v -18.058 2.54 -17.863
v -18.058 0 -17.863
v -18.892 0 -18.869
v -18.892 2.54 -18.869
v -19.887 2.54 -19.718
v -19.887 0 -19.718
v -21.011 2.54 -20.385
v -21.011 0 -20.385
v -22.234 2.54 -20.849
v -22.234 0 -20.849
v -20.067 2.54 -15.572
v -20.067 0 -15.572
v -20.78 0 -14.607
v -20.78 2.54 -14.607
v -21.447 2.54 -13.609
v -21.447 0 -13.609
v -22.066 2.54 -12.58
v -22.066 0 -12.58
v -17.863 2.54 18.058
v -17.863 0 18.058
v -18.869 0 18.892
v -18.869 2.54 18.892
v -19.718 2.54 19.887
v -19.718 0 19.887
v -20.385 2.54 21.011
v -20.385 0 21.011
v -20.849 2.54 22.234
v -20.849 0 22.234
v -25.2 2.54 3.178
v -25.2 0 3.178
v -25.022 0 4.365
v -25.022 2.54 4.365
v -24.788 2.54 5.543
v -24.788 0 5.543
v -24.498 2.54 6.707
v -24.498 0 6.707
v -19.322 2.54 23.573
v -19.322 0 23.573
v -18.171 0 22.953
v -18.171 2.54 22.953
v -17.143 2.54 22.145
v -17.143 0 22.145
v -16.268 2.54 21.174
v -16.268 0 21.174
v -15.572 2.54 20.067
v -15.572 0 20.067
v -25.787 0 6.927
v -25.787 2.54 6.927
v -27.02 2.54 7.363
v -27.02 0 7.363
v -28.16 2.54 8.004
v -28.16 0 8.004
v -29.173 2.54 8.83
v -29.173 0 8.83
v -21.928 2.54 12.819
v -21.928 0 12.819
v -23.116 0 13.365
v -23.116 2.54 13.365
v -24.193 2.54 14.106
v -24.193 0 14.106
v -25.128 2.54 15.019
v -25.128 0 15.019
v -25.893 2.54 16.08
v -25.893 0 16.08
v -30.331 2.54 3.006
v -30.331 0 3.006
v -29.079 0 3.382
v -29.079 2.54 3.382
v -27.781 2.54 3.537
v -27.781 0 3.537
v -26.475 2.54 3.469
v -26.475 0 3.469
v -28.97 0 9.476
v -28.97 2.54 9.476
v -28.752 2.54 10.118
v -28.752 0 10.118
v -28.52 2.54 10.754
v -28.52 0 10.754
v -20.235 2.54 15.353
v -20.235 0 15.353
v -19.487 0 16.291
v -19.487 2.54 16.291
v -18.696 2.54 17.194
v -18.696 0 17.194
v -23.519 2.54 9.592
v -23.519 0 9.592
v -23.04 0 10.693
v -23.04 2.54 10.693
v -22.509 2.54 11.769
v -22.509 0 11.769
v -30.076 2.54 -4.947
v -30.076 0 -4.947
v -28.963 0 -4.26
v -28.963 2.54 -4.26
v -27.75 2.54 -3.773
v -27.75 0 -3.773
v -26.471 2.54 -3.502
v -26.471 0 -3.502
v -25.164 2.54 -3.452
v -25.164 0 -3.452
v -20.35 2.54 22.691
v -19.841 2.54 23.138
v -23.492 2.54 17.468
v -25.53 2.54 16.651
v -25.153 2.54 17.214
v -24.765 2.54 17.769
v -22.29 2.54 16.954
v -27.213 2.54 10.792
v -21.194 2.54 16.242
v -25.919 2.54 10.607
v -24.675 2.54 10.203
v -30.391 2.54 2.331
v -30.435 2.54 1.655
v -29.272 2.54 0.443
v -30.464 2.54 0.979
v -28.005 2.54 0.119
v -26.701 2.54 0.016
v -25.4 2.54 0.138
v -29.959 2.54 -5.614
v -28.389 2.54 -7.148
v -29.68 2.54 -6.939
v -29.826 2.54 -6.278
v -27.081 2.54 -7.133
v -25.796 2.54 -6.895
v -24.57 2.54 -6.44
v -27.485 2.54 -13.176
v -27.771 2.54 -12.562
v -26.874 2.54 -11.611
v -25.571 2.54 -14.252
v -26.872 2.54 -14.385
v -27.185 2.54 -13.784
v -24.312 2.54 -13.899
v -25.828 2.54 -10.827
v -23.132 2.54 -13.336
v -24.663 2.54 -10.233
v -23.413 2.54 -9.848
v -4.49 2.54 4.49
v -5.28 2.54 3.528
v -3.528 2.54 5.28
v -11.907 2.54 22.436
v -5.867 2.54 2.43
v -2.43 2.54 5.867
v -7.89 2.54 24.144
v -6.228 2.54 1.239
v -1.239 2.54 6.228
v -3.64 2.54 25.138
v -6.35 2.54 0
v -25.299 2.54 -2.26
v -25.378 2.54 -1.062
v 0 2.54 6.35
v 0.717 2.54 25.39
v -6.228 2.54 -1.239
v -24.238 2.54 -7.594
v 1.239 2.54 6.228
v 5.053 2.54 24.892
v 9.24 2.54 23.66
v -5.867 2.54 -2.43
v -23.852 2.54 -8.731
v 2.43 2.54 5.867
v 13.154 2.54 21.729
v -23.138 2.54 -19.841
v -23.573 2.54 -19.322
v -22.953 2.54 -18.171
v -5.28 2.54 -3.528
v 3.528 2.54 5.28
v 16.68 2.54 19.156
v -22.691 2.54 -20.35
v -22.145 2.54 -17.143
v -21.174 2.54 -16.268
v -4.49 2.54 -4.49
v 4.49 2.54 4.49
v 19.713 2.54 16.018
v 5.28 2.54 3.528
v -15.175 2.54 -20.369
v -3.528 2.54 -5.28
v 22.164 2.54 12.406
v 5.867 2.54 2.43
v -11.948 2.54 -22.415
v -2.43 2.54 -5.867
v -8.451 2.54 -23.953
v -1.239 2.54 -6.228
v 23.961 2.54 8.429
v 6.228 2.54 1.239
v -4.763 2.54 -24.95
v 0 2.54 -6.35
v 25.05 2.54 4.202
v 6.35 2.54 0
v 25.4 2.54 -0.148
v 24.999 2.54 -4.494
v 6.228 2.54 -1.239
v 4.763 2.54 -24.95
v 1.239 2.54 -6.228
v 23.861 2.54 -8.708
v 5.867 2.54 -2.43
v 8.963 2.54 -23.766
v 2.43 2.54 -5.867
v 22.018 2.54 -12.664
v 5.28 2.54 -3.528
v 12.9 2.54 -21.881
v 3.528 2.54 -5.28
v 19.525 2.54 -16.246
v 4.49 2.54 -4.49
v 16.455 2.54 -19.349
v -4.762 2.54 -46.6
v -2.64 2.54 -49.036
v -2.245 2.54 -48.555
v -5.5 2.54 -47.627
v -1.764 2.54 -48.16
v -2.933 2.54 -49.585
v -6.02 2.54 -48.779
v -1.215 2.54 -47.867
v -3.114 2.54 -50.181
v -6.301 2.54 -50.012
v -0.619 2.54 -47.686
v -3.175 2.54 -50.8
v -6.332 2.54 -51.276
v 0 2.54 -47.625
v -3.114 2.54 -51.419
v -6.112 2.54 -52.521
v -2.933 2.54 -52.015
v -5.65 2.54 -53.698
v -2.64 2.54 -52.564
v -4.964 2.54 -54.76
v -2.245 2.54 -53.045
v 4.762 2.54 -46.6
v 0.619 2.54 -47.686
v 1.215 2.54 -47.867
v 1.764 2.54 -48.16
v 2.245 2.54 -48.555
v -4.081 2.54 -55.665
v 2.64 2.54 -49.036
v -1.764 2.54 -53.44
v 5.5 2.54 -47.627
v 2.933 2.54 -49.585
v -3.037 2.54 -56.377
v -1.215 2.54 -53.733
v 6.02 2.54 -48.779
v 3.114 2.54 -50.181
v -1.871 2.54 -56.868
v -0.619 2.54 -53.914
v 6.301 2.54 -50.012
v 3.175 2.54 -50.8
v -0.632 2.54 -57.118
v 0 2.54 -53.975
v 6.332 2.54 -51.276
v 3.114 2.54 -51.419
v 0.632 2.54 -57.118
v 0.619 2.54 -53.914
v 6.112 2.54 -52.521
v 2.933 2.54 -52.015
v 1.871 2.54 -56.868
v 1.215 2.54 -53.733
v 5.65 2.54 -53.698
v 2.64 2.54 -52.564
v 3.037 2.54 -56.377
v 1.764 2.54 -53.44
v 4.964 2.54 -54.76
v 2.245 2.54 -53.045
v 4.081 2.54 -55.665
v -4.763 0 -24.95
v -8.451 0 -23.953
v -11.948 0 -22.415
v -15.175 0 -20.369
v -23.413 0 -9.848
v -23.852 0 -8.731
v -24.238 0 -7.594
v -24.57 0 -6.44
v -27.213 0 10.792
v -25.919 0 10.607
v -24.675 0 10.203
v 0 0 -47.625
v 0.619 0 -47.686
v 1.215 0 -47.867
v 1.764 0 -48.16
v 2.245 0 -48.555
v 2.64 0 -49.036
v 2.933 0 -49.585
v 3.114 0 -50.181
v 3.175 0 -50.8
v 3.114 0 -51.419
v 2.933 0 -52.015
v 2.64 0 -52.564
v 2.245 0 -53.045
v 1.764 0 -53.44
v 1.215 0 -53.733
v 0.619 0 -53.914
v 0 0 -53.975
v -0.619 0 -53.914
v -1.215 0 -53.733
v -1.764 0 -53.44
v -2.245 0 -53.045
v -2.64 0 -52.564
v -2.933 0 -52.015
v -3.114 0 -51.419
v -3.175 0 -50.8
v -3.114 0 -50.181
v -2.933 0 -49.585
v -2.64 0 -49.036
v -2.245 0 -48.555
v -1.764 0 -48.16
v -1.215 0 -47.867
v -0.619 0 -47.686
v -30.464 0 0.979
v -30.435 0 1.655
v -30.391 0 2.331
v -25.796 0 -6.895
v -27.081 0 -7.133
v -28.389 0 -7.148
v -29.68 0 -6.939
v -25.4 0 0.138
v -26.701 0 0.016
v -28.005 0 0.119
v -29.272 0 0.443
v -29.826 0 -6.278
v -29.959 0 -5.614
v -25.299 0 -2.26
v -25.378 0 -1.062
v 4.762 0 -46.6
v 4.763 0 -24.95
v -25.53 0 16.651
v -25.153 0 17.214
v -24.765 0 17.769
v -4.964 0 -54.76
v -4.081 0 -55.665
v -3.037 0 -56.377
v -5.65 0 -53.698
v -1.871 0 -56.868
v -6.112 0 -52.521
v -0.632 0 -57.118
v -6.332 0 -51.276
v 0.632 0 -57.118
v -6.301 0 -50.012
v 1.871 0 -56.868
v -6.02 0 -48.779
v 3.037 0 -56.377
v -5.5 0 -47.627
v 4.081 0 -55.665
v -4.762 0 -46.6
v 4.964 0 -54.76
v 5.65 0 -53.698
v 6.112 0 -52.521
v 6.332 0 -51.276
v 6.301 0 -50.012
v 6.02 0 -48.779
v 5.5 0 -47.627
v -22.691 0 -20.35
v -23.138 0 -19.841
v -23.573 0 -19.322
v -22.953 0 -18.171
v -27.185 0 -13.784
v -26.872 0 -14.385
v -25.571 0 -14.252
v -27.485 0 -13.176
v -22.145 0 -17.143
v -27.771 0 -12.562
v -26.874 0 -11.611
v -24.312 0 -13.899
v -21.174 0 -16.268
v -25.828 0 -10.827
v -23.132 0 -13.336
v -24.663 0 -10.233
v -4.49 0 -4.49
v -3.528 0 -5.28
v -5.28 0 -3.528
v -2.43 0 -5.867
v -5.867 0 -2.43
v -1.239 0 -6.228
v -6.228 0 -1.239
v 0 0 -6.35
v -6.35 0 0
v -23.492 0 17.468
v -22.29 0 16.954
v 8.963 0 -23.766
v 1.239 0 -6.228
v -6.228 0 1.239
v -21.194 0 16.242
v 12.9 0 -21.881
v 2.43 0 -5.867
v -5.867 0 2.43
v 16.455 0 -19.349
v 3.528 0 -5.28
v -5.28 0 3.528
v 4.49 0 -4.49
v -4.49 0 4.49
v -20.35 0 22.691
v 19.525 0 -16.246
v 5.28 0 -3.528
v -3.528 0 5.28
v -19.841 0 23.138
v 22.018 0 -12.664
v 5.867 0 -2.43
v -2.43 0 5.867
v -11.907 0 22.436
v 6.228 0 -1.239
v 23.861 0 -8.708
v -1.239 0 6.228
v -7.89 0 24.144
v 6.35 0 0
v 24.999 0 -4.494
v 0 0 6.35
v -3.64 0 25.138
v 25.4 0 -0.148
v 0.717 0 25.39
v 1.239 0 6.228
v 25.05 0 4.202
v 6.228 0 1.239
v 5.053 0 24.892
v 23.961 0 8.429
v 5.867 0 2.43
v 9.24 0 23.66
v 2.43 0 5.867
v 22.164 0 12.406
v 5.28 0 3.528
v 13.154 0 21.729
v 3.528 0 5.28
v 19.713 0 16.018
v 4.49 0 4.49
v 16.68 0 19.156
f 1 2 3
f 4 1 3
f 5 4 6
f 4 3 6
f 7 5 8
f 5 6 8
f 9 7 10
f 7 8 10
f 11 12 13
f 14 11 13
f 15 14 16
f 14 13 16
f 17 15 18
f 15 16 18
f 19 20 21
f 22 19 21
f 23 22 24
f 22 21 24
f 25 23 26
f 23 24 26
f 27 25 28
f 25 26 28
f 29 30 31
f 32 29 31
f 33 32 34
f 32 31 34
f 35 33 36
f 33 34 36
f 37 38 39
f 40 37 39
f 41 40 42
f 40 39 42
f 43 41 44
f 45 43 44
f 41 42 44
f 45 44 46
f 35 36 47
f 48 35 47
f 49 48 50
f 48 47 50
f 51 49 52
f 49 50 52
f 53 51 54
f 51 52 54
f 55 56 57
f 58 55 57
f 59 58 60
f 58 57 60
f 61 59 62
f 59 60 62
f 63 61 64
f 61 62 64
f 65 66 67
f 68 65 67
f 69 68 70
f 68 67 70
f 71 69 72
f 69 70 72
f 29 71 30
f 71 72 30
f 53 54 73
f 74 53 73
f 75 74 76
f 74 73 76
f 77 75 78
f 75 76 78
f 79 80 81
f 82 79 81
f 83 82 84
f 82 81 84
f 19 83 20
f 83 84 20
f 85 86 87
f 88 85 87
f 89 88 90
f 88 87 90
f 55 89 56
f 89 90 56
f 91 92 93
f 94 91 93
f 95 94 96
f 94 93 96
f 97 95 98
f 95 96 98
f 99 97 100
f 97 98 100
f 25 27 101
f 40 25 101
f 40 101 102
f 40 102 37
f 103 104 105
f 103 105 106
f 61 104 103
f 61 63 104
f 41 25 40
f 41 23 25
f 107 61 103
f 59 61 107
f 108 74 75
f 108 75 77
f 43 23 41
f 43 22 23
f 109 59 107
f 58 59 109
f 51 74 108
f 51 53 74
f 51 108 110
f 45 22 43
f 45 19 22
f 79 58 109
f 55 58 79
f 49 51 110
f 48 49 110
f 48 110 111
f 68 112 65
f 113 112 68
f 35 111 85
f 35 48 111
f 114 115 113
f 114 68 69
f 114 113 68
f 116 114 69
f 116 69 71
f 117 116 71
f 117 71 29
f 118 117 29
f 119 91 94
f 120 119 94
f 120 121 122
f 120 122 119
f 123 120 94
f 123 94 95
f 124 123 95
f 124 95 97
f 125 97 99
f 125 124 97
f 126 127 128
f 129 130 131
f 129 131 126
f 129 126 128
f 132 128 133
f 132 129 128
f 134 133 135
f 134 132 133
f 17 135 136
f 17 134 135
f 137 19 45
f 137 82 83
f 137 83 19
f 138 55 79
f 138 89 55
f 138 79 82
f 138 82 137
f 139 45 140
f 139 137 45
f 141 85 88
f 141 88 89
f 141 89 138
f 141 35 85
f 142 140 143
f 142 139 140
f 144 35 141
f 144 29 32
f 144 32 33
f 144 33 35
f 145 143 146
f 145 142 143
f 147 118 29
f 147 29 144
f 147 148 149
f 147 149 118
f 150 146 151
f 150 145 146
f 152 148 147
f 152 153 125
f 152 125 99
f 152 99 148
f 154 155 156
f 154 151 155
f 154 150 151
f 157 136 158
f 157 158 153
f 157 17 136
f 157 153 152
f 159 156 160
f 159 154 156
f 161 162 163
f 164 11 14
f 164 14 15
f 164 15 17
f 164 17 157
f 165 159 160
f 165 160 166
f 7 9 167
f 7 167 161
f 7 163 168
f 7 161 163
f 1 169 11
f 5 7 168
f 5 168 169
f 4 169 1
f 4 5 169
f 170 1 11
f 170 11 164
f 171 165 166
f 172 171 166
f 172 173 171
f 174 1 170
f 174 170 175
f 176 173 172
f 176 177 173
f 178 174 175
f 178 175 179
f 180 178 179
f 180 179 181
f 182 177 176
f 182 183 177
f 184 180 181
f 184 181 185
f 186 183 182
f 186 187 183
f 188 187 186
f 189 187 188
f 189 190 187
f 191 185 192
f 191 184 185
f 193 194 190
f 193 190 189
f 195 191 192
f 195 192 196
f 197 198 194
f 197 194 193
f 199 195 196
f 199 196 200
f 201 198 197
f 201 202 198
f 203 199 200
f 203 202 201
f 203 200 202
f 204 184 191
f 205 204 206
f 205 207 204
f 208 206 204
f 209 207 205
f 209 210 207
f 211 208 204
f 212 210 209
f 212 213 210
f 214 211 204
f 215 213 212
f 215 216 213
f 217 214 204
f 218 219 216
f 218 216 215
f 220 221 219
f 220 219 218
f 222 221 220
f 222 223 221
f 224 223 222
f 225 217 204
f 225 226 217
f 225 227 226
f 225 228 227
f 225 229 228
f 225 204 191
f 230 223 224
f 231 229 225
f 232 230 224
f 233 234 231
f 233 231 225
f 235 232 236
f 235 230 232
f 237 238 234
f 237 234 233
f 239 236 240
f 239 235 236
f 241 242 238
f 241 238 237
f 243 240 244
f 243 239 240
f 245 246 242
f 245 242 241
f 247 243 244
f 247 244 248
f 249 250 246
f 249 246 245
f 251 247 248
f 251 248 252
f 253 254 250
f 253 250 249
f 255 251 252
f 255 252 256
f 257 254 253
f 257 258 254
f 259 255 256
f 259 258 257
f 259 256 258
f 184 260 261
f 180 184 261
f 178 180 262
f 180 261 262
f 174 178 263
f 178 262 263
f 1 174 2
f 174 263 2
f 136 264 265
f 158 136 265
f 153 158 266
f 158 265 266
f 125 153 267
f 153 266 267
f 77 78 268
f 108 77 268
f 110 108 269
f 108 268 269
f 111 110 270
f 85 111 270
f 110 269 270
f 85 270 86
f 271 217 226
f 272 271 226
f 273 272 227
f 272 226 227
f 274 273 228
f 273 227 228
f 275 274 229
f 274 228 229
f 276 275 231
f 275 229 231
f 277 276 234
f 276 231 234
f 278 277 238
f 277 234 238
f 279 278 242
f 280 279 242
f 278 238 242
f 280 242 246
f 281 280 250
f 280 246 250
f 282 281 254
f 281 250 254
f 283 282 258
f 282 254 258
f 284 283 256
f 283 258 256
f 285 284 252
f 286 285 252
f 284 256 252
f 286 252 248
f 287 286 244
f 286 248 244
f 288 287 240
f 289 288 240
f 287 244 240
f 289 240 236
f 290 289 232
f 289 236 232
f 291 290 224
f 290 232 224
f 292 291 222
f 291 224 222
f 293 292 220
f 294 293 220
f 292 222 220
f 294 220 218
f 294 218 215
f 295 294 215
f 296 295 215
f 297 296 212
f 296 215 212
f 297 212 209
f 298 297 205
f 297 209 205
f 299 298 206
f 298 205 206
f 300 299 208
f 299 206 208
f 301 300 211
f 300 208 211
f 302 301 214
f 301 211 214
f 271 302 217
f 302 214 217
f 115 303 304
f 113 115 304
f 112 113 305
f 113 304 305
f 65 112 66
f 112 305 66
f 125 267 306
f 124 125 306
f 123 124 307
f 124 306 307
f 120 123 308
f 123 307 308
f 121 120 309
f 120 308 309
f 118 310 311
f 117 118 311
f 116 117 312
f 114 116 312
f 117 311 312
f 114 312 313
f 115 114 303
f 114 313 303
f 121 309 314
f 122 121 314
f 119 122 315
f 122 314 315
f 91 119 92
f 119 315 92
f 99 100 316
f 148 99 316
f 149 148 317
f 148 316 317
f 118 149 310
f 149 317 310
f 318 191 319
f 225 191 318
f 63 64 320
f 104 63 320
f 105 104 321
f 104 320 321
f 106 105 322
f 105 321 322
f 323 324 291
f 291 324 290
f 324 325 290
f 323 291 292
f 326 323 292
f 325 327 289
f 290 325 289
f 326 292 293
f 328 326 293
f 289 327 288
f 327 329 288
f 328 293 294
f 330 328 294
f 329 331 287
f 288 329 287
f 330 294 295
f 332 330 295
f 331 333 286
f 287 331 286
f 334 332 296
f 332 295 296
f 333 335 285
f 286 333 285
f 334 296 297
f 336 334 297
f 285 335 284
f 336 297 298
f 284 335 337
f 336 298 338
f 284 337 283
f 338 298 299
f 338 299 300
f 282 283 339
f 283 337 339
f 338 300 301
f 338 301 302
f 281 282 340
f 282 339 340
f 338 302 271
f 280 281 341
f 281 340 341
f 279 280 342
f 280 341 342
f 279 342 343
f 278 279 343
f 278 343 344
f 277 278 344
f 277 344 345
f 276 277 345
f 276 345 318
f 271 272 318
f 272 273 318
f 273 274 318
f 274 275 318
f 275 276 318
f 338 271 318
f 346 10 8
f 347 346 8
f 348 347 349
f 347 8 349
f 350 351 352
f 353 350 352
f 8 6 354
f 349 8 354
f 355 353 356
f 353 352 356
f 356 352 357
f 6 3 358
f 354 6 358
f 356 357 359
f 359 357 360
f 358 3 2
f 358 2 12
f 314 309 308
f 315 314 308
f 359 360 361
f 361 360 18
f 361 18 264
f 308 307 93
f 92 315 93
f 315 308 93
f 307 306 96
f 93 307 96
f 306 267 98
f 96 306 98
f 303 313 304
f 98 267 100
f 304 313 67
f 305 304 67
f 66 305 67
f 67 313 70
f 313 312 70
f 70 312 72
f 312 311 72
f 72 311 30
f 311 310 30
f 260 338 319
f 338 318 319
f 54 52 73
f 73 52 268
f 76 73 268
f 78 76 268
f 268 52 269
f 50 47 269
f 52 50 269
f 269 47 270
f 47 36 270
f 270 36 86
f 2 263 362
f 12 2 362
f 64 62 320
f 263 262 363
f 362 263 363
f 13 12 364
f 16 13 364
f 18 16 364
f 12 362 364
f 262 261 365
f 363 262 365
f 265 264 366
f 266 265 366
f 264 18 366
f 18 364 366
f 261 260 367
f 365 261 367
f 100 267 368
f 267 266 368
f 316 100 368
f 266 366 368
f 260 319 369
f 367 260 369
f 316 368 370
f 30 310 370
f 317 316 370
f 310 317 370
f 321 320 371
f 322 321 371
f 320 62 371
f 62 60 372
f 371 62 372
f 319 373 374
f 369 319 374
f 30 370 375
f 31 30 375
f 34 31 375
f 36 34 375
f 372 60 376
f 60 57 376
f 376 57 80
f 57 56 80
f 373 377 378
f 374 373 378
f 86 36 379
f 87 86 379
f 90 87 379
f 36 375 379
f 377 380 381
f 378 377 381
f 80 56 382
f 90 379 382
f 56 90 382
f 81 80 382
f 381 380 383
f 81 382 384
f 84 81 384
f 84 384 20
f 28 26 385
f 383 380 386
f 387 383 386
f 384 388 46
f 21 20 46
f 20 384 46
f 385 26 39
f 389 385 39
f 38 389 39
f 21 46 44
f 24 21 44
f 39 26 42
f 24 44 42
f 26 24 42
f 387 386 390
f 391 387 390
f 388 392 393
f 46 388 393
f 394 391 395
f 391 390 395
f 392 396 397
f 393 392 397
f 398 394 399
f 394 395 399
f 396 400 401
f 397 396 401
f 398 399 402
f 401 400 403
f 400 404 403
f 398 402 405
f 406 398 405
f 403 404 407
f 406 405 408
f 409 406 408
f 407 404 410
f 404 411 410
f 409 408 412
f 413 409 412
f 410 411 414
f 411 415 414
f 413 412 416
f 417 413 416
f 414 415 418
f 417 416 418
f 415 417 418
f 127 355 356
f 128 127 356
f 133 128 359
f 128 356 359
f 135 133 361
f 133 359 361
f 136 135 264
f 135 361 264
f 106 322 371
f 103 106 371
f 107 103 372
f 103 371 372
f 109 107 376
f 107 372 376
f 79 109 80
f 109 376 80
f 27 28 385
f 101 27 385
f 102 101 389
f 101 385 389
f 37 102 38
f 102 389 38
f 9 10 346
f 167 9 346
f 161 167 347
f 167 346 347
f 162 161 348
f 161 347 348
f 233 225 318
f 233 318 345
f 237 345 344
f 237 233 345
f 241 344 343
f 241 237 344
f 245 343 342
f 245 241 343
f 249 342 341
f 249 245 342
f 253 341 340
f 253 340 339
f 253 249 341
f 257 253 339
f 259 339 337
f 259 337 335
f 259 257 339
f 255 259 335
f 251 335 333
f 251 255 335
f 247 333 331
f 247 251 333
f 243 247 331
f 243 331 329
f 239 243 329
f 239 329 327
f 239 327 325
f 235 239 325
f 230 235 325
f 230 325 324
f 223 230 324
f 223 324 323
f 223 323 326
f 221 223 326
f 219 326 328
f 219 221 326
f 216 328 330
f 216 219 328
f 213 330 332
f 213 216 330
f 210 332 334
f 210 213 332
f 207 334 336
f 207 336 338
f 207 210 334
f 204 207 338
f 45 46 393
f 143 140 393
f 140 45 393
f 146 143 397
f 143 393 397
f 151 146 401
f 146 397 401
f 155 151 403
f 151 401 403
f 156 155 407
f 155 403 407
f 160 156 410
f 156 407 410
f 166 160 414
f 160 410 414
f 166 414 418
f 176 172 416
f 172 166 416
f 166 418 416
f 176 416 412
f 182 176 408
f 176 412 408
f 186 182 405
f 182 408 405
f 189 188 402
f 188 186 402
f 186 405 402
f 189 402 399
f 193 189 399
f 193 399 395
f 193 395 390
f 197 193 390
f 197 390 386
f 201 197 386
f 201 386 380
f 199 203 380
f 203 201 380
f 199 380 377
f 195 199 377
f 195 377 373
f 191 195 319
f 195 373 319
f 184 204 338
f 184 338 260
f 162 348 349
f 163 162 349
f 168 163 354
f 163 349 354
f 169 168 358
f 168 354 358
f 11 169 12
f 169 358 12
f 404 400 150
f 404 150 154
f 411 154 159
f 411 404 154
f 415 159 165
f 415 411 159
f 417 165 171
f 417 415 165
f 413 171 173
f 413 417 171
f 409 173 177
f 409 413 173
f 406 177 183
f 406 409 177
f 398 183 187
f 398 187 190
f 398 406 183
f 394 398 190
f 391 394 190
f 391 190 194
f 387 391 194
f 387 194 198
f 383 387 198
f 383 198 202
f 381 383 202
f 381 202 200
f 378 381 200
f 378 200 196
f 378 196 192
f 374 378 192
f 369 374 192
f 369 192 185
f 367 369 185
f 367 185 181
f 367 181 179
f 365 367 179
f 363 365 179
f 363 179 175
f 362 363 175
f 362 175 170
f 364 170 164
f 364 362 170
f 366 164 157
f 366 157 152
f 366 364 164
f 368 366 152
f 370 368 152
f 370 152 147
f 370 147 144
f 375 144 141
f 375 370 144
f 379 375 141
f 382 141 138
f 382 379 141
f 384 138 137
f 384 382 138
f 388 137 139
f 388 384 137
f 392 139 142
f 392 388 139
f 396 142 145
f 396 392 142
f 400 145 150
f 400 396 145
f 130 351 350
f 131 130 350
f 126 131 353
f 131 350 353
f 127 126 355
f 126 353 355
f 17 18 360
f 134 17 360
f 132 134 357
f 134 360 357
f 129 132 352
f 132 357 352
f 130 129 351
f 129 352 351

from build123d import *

# Parameters (mm, degrees)
SKETCH1_R           = 25.4
SKETCH1_R_2         = 6.35
BOSS_EXTRUDE1_DEPTH = 2.54
BOSS_EXTRUDE3_DEPTH = 2.54
CIRPATTERN2_DEPTH   = 2.54
SKETCH4_R           = 3.175
BOSS_EXTRUDE4_DEPTH = 2.54


# Read off the part's stored shape, not the designer's step: CirPattern2
with BuildPart() as part:
    # Sketch1 → Boss-Extrude1 (new body)
    with BuildSketch(Plane(origin=(0, 0, 0), x_dir=(1, 0, 0), z_dir=(0, 1, 0))):
        with Locations(Location((0, 0, 0), (0, 0, 270))):
            Circle(SKETCH1_R)
        with Locations(Location((0, 0, 0), (0, 0, 270))):
            Circle(SKETCH1_R_2, mode=Mode.SUBTRACT)
    extrude(amount=BOSS_EXTRUDE1_DEPTH)

    # Sketch3 → Boss-Extrude3 (add)
    with BuildSketch(Plane(origin=(0, 0, 0), x_dir=(1, 0, 0), z_dir=(0, 1, 0))):
        with BuildLine():
            ThreePointArc((-24.569920792, 6.440418643), (-27.081444643, 7.133180463), (-29.679543147, 6.939388921))
            ThreePointArc((-29.679543147, 6.939388921), (-29.894335347, 5.946353015), (-30.075911618, 4.94671005))
            ThreePointArc((-30.075911618, 4.94671005), (-27.7497424, 3.773420758), (-25.164288447, 3.452330656))
            ThreePointArc((-25.164288447, 3.452330656), (-24.911946122, 4.955294179), (-24.569920792, 6.440418643))
        make_face()
    extrude(amount=BOSS_EXTRUDE3_DEPTH)

    # CirPattern2 outline → CirPattern2 (add)
    with BuildSketch(Plane(origin=(0, 0, 0), x_dir=(1, 0, 0), z_dir=(0, 1, 0))):
        with BuildLine():
            ThreePointArc((-23.413307188, 9.847692448), (-22.780567636, 11.234132732), (-22.06581804, 12.580130138))
            ThreePointArc((-22.06581804, 12.580130138), (-24.312463838, 13.899316875), (-26.872191224, 14.384565994))
            ThreePointArc((-26.872191224, 14.384565994), (-27.336681162, 13.480959278), (-27.77079701, 12.562373718))
            ThreePointArc((-27.77079701, 12.562373718), (-25.8275597, 10.827006393), (-23.413307188, 9.847692448))
        make_face()
        with BuildLine():
            ThreePointArc((-20.066747736, 15.571950275), (-19.096731111, 16.747383705), (-18.057966254, 17.862526553))
            ThreePointArc((-18.057966254, 17.862526553), (-19.886628801, 19.718237812), (-22.233543877, 20.849458666))
            ThreePointArc((-22.233543877, 20.849458666), (-22.916077332, 20.096860444), (-23.573148479, 19.321932378))
            ThreePointArc((-23.573148479, 19.321932378), (-22.145271488, 17.142749435), (-20.066747736, 15.571950275))
        make_face()
        with BuildLine():
            ThreePointArc((-15.571950272, -20.066747733), (-16.747383702, -19.096731108), (-17.86252655, -18.057966251))
            ThreePointArc((-17.86252655, -18.057966251), (-19.718237812, -19.886628801), (-20.849458666, -22.233543877))
            ThreePointArc((-20.849458666, -22.233543877), (-20.096860444, -22.916077332), (-19.321932378, -23.573148479))
            ThreePointArc((-19.321932378, -23.573148479), (-17.142749435, -22.145271488), (-15.571950272, -20.066747733))
        make_face()
        with BuildLine():
            ThreePointArc((-20.235005421, -15.352672585), (-21.119328151, -14.111483918), (-21.927621299, -12.819493908))
            ThreePointArc((-21.927621299, -12.819493908), (-24.193393428, -14.105552875), (-25.893495185, -16.079717258))
            ThreePointArc((-25.893495185, -16.079717258), (-25.343193783, -16.933780702), (-24.764733277, -17.769028835))
            ThreePointArc((-24.764733277, -17.769028835), (-22.290242434, -16.953819621), (-20.235005421, -15.352672585))
        make_face()
        with BuildLine():
            ThreePointArc((-23.51907839, -9.592338172), (-24.052025288, -8.164562418), (-24.498384895, -6.70739424))
            ThreePointArc((-24.498384895, -6.70739424), (-27.019809264, -7.363206831), (-29.172932798, -8.830084481))
            ThreePointArc((-29.172932798, -8.830084481), (-28.862430347, -9.797474903), (-28.519858529, -10.753979241))
            ThreePointArc((-28.519858529, -10.753979241), (-25.918692246, -10.606992964), (-23.51907839, -9.592338172))
        make_face()
        with BuildLine():
            ThreePointArc((-30.464283252, -0.978696039), (-30.41473998, -1.993487379), (-30.331402553, -3.006063733))
            ThreePointArc((-30.331402553, -3.006063733), (-27.780826014, -3.537317266), (-25.200365035, -3.178301765))
            ThreePointArc((-25.200365035, -3.178301765), (-25.34561665, -1.661239483), (-25.399624045, -0.138196738))
            ThreePointArc((-25.399624045, -0.138196738), (-28.00486975, -0.11907041), (-30.464283252, -0.978696039))
        make_face()
    extrude(amount=CIRPATTERN2_DEPTH)

    # Sketch4 → Boss-Extrude4 (add)
    with BuildSketch(Plane(origin=(0, 2.54, 0), x_dir=(1, 0, 0), z_dir=(0, 1, 0))):
        with BuildLine():
            Line((-4.7625, 6.35), (4.7625, 6.35))
            Line((4.7625, 6.35), (4.7625, 46.599869794))
            ThreePointArc((4.7625, 46.599869794), (0, 57.15), (-4.7625, 46.599869794))
            Line((-4.7625, 46.599869794), (-4.7625, 6.35))
        make_face()
        with Locations(Location((0, 50.8, 0), (0, 0, 270))):
            Circle(SKETCH4_R, mode=Mode.SUBTRACT)
    extrude(amount=-BOSS_EXTRUDE4_DEPTH)


solid = part.part
